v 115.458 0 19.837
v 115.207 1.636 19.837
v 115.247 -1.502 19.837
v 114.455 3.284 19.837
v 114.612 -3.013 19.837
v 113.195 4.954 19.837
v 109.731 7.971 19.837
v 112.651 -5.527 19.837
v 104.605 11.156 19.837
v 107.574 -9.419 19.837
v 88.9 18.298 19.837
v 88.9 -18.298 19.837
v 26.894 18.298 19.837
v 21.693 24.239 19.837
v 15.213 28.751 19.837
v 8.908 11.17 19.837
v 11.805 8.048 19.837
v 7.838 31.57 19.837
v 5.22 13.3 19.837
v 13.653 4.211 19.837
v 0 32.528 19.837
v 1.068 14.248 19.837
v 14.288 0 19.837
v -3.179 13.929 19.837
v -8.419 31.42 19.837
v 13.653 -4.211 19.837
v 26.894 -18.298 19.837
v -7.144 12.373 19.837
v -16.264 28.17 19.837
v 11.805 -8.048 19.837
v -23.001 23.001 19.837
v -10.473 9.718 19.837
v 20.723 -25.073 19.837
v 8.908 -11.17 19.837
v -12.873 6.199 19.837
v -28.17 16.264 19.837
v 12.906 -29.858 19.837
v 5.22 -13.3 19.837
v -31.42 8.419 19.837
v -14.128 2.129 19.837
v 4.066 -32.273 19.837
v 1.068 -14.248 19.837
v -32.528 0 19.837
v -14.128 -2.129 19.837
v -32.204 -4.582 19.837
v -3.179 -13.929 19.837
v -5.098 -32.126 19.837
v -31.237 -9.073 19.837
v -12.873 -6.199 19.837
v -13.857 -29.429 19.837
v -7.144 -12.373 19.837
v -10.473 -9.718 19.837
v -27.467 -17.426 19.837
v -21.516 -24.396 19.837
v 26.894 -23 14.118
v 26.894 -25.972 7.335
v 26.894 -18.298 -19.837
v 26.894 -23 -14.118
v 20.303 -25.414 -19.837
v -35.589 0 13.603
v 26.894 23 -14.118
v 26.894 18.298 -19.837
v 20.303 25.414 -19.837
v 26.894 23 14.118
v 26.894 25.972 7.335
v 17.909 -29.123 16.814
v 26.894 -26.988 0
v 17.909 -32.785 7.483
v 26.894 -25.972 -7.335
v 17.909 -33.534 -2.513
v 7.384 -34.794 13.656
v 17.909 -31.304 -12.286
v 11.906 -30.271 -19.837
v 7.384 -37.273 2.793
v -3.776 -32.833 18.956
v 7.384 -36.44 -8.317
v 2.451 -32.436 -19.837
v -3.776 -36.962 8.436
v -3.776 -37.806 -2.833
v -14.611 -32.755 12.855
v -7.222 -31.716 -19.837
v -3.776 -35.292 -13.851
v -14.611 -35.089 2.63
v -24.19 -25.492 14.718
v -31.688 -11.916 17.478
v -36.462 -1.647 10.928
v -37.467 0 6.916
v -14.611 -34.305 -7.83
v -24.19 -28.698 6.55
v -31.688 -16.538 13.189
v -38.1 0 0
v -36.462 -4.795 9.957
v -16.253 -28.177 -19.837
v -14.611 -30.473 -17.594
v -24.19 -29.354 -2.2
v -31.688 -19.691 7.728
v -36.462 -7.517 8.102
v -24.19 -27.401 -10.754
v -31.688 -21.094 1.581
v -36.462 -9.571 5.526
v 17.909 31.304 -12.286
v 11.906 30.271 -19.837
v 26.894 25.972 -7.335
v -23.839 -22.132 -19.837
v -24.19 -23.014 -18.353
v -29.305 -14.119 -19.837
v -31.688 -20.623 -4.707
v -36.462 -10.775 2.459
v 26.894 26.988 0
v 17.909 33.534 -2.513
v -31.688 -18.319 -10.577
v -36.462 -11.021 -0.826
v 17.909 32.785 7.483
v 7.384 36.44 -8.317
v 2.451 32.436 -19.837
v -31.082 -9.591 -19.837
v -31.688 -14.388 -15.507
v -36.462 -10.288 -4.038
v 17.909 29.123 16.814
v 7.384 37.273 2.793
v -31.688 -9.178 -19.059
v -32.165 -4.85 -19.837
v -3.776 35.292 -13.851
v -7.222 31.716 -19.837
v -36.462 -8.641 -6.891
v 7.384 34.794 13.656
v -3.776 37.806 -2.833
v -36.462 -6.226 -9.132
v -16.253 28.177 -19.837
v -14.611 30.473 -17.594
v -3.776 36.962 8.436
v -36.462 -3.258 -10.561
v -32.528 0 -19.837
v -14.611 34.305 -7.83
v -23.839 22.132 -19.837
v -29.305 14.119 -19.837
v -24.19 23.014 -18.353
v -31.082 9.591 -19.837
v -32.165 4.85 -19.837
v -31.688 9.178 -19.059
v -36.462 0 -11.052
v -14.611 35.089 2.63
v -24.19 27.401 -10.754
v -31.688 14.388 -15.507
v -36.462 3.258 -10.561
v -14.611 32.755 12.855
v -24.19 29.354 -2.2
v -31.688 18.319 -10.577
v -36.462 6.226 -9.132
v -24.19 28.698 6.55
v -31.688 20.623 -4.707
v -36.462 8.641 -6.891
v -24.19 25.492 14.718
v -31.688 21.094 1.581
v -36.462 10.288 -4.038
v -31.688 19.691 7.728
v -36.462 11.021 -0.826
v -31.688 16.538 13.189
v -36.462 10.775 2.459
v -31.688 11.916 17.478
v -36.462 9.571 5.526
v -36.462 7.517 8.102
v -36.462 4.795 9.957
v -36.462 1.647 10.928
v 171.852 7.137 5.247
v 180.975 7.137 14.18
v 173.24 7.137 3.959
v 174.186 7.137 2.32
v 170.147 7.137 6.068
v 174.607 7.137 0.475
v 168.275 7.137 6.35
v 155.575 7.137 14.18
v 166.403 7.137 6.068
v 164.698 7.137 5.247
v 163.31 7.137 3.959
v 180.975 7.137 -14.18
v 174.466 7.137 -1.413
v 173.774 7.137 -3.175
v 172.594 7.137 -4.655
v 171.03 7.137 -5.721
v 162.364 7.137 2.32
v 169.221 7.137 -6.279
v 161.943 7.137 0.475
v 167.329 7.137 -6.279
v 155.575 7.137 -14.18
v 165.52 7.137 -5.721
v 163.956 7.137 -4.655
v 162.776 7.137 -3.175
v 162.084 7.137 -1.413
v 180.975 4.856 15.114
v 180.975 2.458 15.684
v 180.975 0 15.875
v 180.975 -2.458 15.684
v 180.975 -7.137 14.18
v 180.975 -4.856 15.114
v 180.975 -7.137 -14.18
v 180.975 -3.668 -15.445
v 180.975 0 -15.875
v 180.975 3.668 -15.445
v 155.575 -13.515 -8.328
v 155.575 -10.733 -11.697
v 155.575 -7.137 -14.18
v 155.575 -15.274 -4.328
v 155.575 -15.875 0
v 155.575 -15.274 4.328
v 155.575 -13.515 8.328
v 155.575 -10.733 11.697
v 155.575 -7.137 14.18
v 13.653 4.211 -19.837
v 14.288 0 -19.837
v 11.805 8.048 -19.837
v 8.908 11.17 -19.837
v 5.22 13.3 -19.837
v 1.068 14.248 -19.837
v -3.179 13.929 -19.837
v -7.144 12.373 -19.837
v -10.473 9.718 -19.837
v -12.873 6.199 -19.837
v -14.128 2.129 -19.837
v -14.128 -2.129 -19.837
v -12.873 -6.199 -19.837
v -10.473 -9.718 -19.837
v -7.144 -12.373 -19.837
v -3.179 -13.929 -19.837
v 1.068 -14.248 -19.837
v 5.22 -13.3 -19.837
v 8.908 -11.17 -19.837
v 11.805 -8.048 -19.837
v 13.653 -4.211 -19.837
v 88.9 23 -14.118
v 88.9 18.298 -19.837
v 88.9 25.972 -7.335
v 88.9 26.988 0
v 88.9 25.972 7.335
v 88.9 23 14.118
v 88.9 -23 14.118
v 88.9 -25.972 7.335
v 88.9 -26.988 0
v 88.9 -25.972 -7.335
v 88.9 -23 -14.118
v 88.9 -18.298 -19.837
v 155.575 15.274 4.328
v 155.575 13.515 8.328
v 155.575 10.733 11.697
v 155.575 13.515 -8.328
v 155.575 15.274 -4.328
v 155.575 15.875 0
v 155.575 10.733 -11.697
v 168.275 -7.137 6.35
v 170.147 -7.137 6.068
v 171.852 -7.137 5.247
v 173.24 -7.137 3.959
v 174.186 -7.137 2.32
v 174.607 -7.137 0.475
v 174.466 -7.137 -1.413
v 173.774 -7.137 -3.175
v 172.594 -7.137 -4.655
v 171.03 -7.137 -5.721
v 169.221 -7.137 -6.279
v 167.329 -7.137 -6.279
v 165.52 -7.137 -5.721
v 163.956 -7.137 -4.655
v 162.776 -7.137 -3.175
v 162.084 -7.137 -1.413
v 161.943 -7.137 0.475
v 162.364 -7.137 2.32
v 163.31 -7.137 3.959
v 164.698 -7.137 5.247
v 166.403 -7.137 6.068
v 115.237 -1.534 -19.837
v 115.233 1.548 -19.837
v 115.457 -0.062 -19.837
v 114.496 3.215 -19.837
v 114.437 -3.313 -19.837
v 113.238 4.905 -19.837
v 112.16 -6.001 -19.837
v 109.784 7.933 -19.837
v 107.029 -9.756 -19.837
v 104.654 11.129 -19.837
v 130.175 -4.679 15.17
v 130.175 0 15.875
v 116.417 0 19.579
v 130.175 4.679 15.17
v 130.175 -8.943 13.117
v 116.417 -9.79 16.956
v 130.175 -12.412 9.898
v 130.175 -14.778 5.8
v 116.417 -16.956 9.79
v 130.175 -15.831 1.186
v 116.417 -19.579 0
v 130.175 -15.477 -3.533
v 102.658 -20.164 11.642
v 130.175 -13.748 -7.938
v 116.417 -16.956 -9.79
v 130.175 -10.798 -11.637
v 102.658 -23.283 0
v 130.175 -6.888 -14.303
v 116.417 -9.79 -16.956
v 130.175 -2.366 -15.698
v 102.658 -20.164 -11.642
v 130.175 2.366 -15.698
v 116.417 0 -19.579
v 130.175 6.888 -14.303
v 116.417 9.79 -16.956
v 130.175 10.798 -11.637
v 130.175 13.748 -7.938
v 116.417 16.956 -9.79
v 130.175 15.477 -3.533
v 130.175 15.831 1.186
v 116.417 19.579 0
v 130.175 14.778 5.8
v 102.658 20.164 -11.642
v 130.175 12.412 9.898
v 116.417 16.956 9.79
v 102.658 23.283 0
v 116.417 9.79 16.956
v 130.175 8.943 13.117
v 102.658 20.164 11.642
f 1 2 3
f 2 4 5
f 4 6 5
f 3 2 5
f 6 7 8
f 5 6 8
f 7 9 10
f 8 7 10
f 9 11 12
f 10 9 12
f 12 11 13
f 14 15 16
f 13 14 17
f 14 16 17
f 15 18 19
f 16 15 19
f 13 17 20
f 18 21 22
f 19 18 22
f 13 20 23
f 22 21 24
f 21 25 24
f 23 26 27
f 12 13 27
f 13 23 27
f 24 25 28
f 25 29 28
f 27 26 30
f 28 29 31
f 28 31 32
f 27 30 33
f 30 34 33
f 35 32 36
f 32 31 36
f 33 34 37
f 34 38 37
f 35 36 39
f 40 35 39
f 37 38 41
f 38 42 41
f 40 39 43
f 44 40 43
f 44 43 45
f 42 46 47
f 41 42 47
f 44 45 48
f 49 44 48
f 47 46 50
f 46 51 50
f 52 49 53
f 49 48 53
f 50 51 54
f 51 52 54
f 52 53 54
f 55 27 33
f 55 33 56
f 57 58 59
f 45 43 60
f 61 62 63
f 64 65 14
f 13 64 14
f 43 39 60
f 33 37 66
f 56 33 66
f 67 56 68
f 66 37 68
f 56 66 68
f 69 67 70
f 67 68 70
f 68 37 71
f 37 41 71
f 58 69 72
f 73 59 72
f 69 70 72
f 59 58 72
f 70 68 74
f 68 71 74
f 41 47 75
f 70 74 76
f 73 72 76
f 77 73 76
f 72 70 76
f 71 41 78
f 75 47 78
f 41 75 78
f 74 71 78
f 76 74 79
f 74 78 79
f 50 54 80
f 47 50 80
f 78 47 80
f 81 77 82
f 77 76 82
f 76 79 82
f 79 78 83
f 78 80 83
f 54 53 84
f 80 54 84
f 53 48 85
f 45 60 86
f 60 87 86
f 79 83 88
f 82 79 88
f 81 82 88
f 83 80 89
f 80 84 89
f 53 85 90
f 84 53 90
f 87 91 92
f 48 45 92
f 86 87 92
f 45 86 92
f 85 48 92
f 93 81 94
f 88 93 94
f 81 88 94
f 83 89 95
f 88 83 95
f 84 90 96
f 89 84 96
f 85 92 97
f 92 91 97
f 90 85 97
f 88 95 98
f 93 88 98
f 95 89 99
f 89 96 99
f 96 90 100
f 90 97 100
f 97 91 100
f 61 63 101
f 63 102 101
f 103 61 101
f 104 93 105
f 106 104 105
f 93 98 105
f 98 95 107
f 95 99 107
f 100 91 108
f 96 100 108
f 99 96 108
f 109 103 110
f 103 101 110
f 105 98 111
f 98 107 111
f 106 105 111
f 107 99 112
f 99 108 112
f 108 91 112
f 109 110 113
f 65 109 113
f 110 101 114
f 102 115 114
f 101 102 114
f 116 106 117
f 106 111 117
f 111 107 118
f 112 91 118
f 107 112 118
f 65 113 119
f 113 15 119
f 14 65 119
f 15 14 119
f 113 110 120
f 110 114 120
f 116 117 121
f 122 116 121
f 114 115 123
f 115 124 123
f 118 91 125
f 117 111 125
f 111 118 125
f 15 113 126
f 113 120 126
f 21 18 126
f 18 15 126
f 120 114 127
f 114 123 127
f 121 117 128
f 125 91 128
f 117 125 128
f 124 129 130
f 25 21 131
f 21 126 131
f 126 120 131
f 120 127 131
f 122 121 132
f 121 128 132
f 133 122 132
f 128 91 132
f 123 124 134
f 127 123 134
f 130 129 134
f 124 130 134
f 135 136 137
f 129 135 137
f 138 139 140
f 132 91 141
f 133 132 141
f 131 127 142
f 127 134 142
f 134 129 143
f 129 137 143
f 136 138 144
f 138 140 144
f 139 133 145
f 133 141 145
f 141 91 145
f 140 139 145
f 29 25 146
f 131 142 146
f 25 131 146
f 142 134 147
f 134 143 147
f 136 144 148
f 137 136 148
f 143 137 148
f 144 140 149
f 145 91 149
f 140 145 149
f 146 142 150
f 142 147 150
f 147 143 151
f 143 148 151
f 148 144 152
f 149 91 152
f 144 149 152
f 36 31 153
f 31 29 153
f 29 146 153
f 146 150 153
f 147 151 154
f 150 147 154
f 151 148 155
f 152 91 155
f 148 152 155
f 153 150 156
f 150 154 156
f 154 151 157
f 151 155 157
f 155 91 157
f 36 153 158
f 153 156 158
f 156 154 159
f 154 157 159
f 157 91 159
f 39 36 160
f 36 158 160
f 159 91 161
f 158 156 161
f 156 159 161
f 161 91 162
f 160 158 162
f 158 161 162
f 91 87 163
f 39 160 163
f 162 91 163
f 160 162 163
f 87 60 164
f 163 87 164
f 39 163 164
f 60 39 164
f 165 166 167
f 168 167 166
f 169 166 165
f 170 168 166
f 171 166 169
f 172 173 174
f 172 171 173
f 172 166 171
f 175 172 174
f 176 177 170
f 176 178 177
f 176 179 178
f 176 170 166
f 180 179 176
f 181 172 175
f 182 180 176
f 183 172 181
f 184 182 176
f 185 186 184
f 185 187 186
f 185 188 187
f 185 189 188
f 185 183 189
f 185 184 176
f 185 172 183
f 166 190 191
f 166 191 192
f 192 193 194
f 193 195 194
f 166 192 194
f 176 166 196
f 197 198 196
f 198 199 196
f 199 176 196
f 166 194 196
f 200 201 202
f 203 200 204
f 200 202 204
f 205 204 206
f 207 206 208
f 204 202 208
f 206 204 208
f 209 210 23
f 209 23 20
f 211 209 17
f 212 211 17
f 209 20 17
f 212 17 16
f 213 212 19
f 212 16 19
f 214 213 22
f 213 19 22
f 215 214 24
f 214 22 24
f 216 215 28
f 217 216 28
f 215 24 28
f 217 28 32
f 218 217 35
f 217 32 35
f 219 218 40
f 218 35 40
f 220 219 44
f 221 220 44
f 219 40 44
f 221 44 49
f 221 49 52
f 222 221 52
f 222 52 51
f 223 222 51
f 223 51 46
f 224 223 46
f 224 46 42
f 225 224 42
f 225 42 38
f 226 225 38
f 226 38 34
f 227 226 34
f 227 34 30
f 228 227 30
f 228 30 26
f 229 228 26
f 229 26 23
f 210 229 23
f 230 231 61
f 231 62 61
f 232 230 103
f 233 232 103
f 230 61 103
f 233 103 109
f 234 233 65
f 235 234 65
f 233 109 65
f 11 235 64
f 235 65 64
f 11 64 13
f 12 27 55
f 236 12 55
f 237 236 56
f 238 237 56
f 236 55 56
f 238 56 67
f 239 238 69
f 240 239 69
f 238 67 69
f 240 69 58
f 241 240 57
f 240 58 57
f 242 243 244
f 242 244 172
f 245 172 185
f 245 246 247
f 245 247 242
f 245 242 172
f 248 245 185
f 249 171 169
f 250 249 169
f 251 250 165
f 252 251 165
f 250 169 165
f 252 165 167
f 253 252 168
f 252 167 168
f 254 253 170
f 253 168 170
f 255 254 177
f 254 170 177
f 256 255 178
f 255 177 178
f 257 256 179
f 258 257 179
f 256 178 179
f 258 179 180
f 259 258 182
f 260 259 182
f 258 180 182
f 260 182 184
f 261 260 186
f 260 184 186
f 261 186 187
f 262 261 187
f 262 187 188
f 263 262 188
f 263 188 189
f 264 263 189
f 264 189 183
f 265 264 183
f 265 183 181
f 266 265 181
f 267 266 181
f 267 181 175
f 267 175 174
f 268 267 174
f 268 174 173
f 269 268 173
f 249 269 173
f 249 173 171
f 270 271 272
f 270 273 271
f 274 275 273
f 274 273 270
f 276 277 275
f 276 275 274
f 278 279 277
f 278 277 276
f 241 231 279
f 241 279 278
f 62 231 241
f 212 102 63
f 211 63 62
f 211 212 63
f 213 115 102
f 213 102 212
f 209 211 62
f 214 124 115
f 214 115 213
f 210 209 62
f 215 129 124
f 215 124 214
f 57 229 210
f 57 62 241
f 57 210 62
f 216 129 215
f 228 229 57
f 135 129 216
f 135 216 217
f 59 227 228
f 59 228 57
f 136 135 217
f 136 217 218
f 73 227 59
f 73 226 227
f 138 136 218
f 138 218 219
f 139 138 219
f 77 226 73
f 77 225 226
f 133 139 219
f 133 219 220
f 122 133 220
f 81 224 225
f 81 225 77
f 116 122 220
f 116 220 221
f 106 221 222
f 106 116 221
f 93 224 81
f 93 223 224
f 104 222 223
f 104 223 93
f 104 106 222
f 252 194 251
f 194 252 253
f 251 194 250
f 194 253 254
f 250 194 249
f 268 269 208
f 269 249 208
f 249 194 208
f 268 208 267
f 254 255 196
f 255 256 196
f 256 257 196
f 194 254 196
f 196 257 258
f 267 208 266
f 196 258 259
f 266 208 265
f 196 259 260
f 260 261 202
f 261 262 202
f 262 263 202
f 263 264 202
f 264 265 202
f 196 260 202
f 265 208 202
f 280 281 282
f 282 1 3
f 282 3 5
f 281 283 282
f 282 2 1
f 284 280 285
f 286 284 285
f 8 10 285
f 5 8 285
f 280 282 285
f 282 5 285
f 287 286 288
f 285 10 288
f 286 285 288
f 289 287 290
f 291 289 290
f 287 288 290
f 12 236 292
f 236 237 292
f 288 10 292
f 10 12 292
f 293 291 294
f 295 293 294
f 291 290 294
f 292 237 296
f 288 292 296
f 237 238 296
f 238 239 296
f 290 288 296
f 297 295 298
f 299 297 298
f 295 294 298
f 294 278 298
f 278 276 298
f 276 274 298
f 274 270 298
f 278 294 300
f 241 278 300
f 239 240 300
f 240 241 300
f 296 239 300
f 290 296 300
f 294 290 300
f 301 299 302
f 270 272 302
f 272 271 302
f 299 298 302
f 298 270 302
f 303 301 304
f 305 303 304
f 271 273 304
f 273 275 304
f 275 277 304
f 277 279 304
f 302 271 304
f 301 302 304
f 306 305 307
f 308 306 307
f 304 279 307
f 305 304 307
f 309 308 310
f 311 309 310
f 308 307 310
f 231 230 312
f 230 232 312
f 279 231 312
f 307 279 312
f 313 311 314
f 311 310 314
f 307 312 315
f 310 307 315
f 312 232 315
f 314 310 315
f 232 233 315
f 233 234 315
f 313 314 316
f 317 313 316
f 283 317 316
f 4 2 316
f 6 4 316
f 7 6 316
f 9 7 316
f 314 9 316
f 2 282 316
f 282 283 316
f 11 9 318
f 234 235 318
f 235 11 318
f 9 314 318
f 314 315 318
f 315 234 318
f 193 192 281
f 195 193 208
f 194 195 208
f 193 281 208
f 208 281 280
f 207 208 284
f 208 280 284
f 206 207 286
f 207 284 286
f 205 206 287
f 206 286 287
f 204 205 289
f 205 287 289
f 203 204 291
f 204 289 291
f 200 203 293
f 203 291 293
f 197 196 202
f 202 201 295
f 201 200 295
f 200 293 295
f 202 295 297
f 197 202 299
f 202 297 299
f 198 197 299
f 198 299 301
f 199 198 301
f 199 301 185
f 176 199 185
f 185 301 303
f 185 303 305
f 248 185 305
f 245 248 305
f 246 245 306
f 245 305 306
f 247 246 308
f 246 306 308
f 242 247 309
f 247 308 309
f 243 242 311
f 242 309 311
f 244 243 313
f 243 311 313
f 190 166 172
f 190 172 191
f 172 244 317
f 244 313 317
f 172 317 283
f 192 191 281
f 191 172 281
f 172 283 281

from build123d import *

# Parameters (mm, degrees)
CORTAR_EXTRUIR1_DEPTH      = 226.603802328
CORTAR_EXTRUIR1_DEPTH_BACK = 226.603802328
CORTAR_EXTRUIR2_START      = -25.4
CORTAR_EXTRUIR2_DEPTH      = 25.4
CORTAR_EXTRUIR3_REACH      = 189.595
CROQUIS5_R                 = 6.35
CORTAR_EXTRUIR4_REACH      = 191.15
CROQUIS6_R                 = 14.2875


with BuildPart() as part:
    # Croquis2 → Revolución1 (revolve)
    with BuildSketch(Plane.XY, mode=Mode.PRIVATE) as revoluci_n1_sk:
        with BuildLine():
            Line((-38.1, 0), (180.975, 0))
            Line((180.975, 0), (180.975, 15.875))
            Line((180.975, 15.875), (130.175, 15.875))
            Line((130.175, 15.875), (88.9, 26.9875))
            Line((88.9, 26.9875), (26.893955524, 26.9875))
            ThreePointArc((26.893955524, 26.9875), (-14.610788728, 35.187140446), (-38.1, 0))
        make_face()
    revolve(revoluci_n1_sk.sketch.rotate(Axis((-38.1, 0, 0), (1, 0, 0)), 90), axis=Axis((-38.1, 0, 0), (1, 0, 0)))

    # Croquis3 → Cortar-Extruir1 (cut, two sides: drawn at the far end of the back side and taken through both)
    with BuildSketch(Plane(origin=(180.975, 0, 0), x_dir=(0, 0, -1), z_dir=(1, 0, 0)).offset(-CORTAR_EXTRUIR1_DEPTH_BACK)):
        with BuildLine():
            Line((-19.8374, 32.528257888), (-19.8374, -32.528257888))
            ThreePointArc((-19.8374, -32.528257888), (-38.1, 0), (-19.8374, 32.528257888))
        make_face()
        with BuildLine():
            Line((19.8374, 32.528257888), (19.8374, -32.528257888))
            ThreePointArc((19.8374, -32.528257888), (38.1, 0), (19.8374, 32.528257888))
        make_face()
    extrude(amount=CORTAR_EXTRUIR1_DEPTH + CORTAR_EXTRUIR1_DEPTH_BACK, mode=Mode.SUBTRACT)

    # Croquis4 → Cortar-Extruir2 (cut)
    with BuildSketch(Plane(origin=(180.975, 0, 0), x_dir=(0, 0, -1), z_dir=(1, 0, 0)).offset(CORTAR_EXTRUIR2_START)):
        with BuildLine():
            Line((-14.180026313, 7.1374), (14.180026313, 7.1374))
            ThreePointArc((14.180026313, 7.1374), (0, 15.875), (-14.180026313, 7.1374))
        make_face()
        with BuildLine():
            Line((-14.180026313, -7.1374), (14.180026313, -7.1374))
            ThreePointArc((14.180026313, -7.1374), (0, -15.875), (-14.180026313, -7.1374))
        make_face()
    extrude(amount=CORTAR_EXTRUIR2_DEPTH, mode=Mode.SUBTRACT)

    # Croquis5 → Cortar-Extruir3 (cut, up to next)
    with BuildSketch(Plane(origin=(0, 7.1374, 0), x_dir=(1, 0, 0), z_dir=(0, 1, 0)), mode=Mode.PRIVATE) as cortar_extruir3_sk1:
        with Locations(Location((168.275, 0, 0), (0, 0, 270))):
            Circle(CROQUIS5_R)
    cortar_extruir3_tool1 = extrude(cortar_extruir3_sk1.sketch, amount=-CORTAR_EXTRUIR3_REACH, mode=Mode.PRIVATE) & part.part
    add(cortar_extruir3_tool1.solids().sort_by_distance((168.275, 7.1374, 0))[0], mode=Mode.SUBTRACT)

    # Croquis6 → Cortar-Extruir4 (cut, up to next)
    with BuildSketch(Plane.XY.offset(19.8374), mode=Mode.PRIVATE) as cortar_extruir4_sk1:
        Circle(CROQUIS6_R)
    cortar_extruir4_tool1 = extrude(cortar_extruir4_sk1.sketch, amount=-CORTAR_EXTRUIR4_REACH, mode=Mode.PRIVATE) & part.part
    add(cortar_extruir4_tool1.solids().sort_by_distance((0, 0, 19.8374))[0], mode=Mode.SUBTRACT)


solid = part.part
